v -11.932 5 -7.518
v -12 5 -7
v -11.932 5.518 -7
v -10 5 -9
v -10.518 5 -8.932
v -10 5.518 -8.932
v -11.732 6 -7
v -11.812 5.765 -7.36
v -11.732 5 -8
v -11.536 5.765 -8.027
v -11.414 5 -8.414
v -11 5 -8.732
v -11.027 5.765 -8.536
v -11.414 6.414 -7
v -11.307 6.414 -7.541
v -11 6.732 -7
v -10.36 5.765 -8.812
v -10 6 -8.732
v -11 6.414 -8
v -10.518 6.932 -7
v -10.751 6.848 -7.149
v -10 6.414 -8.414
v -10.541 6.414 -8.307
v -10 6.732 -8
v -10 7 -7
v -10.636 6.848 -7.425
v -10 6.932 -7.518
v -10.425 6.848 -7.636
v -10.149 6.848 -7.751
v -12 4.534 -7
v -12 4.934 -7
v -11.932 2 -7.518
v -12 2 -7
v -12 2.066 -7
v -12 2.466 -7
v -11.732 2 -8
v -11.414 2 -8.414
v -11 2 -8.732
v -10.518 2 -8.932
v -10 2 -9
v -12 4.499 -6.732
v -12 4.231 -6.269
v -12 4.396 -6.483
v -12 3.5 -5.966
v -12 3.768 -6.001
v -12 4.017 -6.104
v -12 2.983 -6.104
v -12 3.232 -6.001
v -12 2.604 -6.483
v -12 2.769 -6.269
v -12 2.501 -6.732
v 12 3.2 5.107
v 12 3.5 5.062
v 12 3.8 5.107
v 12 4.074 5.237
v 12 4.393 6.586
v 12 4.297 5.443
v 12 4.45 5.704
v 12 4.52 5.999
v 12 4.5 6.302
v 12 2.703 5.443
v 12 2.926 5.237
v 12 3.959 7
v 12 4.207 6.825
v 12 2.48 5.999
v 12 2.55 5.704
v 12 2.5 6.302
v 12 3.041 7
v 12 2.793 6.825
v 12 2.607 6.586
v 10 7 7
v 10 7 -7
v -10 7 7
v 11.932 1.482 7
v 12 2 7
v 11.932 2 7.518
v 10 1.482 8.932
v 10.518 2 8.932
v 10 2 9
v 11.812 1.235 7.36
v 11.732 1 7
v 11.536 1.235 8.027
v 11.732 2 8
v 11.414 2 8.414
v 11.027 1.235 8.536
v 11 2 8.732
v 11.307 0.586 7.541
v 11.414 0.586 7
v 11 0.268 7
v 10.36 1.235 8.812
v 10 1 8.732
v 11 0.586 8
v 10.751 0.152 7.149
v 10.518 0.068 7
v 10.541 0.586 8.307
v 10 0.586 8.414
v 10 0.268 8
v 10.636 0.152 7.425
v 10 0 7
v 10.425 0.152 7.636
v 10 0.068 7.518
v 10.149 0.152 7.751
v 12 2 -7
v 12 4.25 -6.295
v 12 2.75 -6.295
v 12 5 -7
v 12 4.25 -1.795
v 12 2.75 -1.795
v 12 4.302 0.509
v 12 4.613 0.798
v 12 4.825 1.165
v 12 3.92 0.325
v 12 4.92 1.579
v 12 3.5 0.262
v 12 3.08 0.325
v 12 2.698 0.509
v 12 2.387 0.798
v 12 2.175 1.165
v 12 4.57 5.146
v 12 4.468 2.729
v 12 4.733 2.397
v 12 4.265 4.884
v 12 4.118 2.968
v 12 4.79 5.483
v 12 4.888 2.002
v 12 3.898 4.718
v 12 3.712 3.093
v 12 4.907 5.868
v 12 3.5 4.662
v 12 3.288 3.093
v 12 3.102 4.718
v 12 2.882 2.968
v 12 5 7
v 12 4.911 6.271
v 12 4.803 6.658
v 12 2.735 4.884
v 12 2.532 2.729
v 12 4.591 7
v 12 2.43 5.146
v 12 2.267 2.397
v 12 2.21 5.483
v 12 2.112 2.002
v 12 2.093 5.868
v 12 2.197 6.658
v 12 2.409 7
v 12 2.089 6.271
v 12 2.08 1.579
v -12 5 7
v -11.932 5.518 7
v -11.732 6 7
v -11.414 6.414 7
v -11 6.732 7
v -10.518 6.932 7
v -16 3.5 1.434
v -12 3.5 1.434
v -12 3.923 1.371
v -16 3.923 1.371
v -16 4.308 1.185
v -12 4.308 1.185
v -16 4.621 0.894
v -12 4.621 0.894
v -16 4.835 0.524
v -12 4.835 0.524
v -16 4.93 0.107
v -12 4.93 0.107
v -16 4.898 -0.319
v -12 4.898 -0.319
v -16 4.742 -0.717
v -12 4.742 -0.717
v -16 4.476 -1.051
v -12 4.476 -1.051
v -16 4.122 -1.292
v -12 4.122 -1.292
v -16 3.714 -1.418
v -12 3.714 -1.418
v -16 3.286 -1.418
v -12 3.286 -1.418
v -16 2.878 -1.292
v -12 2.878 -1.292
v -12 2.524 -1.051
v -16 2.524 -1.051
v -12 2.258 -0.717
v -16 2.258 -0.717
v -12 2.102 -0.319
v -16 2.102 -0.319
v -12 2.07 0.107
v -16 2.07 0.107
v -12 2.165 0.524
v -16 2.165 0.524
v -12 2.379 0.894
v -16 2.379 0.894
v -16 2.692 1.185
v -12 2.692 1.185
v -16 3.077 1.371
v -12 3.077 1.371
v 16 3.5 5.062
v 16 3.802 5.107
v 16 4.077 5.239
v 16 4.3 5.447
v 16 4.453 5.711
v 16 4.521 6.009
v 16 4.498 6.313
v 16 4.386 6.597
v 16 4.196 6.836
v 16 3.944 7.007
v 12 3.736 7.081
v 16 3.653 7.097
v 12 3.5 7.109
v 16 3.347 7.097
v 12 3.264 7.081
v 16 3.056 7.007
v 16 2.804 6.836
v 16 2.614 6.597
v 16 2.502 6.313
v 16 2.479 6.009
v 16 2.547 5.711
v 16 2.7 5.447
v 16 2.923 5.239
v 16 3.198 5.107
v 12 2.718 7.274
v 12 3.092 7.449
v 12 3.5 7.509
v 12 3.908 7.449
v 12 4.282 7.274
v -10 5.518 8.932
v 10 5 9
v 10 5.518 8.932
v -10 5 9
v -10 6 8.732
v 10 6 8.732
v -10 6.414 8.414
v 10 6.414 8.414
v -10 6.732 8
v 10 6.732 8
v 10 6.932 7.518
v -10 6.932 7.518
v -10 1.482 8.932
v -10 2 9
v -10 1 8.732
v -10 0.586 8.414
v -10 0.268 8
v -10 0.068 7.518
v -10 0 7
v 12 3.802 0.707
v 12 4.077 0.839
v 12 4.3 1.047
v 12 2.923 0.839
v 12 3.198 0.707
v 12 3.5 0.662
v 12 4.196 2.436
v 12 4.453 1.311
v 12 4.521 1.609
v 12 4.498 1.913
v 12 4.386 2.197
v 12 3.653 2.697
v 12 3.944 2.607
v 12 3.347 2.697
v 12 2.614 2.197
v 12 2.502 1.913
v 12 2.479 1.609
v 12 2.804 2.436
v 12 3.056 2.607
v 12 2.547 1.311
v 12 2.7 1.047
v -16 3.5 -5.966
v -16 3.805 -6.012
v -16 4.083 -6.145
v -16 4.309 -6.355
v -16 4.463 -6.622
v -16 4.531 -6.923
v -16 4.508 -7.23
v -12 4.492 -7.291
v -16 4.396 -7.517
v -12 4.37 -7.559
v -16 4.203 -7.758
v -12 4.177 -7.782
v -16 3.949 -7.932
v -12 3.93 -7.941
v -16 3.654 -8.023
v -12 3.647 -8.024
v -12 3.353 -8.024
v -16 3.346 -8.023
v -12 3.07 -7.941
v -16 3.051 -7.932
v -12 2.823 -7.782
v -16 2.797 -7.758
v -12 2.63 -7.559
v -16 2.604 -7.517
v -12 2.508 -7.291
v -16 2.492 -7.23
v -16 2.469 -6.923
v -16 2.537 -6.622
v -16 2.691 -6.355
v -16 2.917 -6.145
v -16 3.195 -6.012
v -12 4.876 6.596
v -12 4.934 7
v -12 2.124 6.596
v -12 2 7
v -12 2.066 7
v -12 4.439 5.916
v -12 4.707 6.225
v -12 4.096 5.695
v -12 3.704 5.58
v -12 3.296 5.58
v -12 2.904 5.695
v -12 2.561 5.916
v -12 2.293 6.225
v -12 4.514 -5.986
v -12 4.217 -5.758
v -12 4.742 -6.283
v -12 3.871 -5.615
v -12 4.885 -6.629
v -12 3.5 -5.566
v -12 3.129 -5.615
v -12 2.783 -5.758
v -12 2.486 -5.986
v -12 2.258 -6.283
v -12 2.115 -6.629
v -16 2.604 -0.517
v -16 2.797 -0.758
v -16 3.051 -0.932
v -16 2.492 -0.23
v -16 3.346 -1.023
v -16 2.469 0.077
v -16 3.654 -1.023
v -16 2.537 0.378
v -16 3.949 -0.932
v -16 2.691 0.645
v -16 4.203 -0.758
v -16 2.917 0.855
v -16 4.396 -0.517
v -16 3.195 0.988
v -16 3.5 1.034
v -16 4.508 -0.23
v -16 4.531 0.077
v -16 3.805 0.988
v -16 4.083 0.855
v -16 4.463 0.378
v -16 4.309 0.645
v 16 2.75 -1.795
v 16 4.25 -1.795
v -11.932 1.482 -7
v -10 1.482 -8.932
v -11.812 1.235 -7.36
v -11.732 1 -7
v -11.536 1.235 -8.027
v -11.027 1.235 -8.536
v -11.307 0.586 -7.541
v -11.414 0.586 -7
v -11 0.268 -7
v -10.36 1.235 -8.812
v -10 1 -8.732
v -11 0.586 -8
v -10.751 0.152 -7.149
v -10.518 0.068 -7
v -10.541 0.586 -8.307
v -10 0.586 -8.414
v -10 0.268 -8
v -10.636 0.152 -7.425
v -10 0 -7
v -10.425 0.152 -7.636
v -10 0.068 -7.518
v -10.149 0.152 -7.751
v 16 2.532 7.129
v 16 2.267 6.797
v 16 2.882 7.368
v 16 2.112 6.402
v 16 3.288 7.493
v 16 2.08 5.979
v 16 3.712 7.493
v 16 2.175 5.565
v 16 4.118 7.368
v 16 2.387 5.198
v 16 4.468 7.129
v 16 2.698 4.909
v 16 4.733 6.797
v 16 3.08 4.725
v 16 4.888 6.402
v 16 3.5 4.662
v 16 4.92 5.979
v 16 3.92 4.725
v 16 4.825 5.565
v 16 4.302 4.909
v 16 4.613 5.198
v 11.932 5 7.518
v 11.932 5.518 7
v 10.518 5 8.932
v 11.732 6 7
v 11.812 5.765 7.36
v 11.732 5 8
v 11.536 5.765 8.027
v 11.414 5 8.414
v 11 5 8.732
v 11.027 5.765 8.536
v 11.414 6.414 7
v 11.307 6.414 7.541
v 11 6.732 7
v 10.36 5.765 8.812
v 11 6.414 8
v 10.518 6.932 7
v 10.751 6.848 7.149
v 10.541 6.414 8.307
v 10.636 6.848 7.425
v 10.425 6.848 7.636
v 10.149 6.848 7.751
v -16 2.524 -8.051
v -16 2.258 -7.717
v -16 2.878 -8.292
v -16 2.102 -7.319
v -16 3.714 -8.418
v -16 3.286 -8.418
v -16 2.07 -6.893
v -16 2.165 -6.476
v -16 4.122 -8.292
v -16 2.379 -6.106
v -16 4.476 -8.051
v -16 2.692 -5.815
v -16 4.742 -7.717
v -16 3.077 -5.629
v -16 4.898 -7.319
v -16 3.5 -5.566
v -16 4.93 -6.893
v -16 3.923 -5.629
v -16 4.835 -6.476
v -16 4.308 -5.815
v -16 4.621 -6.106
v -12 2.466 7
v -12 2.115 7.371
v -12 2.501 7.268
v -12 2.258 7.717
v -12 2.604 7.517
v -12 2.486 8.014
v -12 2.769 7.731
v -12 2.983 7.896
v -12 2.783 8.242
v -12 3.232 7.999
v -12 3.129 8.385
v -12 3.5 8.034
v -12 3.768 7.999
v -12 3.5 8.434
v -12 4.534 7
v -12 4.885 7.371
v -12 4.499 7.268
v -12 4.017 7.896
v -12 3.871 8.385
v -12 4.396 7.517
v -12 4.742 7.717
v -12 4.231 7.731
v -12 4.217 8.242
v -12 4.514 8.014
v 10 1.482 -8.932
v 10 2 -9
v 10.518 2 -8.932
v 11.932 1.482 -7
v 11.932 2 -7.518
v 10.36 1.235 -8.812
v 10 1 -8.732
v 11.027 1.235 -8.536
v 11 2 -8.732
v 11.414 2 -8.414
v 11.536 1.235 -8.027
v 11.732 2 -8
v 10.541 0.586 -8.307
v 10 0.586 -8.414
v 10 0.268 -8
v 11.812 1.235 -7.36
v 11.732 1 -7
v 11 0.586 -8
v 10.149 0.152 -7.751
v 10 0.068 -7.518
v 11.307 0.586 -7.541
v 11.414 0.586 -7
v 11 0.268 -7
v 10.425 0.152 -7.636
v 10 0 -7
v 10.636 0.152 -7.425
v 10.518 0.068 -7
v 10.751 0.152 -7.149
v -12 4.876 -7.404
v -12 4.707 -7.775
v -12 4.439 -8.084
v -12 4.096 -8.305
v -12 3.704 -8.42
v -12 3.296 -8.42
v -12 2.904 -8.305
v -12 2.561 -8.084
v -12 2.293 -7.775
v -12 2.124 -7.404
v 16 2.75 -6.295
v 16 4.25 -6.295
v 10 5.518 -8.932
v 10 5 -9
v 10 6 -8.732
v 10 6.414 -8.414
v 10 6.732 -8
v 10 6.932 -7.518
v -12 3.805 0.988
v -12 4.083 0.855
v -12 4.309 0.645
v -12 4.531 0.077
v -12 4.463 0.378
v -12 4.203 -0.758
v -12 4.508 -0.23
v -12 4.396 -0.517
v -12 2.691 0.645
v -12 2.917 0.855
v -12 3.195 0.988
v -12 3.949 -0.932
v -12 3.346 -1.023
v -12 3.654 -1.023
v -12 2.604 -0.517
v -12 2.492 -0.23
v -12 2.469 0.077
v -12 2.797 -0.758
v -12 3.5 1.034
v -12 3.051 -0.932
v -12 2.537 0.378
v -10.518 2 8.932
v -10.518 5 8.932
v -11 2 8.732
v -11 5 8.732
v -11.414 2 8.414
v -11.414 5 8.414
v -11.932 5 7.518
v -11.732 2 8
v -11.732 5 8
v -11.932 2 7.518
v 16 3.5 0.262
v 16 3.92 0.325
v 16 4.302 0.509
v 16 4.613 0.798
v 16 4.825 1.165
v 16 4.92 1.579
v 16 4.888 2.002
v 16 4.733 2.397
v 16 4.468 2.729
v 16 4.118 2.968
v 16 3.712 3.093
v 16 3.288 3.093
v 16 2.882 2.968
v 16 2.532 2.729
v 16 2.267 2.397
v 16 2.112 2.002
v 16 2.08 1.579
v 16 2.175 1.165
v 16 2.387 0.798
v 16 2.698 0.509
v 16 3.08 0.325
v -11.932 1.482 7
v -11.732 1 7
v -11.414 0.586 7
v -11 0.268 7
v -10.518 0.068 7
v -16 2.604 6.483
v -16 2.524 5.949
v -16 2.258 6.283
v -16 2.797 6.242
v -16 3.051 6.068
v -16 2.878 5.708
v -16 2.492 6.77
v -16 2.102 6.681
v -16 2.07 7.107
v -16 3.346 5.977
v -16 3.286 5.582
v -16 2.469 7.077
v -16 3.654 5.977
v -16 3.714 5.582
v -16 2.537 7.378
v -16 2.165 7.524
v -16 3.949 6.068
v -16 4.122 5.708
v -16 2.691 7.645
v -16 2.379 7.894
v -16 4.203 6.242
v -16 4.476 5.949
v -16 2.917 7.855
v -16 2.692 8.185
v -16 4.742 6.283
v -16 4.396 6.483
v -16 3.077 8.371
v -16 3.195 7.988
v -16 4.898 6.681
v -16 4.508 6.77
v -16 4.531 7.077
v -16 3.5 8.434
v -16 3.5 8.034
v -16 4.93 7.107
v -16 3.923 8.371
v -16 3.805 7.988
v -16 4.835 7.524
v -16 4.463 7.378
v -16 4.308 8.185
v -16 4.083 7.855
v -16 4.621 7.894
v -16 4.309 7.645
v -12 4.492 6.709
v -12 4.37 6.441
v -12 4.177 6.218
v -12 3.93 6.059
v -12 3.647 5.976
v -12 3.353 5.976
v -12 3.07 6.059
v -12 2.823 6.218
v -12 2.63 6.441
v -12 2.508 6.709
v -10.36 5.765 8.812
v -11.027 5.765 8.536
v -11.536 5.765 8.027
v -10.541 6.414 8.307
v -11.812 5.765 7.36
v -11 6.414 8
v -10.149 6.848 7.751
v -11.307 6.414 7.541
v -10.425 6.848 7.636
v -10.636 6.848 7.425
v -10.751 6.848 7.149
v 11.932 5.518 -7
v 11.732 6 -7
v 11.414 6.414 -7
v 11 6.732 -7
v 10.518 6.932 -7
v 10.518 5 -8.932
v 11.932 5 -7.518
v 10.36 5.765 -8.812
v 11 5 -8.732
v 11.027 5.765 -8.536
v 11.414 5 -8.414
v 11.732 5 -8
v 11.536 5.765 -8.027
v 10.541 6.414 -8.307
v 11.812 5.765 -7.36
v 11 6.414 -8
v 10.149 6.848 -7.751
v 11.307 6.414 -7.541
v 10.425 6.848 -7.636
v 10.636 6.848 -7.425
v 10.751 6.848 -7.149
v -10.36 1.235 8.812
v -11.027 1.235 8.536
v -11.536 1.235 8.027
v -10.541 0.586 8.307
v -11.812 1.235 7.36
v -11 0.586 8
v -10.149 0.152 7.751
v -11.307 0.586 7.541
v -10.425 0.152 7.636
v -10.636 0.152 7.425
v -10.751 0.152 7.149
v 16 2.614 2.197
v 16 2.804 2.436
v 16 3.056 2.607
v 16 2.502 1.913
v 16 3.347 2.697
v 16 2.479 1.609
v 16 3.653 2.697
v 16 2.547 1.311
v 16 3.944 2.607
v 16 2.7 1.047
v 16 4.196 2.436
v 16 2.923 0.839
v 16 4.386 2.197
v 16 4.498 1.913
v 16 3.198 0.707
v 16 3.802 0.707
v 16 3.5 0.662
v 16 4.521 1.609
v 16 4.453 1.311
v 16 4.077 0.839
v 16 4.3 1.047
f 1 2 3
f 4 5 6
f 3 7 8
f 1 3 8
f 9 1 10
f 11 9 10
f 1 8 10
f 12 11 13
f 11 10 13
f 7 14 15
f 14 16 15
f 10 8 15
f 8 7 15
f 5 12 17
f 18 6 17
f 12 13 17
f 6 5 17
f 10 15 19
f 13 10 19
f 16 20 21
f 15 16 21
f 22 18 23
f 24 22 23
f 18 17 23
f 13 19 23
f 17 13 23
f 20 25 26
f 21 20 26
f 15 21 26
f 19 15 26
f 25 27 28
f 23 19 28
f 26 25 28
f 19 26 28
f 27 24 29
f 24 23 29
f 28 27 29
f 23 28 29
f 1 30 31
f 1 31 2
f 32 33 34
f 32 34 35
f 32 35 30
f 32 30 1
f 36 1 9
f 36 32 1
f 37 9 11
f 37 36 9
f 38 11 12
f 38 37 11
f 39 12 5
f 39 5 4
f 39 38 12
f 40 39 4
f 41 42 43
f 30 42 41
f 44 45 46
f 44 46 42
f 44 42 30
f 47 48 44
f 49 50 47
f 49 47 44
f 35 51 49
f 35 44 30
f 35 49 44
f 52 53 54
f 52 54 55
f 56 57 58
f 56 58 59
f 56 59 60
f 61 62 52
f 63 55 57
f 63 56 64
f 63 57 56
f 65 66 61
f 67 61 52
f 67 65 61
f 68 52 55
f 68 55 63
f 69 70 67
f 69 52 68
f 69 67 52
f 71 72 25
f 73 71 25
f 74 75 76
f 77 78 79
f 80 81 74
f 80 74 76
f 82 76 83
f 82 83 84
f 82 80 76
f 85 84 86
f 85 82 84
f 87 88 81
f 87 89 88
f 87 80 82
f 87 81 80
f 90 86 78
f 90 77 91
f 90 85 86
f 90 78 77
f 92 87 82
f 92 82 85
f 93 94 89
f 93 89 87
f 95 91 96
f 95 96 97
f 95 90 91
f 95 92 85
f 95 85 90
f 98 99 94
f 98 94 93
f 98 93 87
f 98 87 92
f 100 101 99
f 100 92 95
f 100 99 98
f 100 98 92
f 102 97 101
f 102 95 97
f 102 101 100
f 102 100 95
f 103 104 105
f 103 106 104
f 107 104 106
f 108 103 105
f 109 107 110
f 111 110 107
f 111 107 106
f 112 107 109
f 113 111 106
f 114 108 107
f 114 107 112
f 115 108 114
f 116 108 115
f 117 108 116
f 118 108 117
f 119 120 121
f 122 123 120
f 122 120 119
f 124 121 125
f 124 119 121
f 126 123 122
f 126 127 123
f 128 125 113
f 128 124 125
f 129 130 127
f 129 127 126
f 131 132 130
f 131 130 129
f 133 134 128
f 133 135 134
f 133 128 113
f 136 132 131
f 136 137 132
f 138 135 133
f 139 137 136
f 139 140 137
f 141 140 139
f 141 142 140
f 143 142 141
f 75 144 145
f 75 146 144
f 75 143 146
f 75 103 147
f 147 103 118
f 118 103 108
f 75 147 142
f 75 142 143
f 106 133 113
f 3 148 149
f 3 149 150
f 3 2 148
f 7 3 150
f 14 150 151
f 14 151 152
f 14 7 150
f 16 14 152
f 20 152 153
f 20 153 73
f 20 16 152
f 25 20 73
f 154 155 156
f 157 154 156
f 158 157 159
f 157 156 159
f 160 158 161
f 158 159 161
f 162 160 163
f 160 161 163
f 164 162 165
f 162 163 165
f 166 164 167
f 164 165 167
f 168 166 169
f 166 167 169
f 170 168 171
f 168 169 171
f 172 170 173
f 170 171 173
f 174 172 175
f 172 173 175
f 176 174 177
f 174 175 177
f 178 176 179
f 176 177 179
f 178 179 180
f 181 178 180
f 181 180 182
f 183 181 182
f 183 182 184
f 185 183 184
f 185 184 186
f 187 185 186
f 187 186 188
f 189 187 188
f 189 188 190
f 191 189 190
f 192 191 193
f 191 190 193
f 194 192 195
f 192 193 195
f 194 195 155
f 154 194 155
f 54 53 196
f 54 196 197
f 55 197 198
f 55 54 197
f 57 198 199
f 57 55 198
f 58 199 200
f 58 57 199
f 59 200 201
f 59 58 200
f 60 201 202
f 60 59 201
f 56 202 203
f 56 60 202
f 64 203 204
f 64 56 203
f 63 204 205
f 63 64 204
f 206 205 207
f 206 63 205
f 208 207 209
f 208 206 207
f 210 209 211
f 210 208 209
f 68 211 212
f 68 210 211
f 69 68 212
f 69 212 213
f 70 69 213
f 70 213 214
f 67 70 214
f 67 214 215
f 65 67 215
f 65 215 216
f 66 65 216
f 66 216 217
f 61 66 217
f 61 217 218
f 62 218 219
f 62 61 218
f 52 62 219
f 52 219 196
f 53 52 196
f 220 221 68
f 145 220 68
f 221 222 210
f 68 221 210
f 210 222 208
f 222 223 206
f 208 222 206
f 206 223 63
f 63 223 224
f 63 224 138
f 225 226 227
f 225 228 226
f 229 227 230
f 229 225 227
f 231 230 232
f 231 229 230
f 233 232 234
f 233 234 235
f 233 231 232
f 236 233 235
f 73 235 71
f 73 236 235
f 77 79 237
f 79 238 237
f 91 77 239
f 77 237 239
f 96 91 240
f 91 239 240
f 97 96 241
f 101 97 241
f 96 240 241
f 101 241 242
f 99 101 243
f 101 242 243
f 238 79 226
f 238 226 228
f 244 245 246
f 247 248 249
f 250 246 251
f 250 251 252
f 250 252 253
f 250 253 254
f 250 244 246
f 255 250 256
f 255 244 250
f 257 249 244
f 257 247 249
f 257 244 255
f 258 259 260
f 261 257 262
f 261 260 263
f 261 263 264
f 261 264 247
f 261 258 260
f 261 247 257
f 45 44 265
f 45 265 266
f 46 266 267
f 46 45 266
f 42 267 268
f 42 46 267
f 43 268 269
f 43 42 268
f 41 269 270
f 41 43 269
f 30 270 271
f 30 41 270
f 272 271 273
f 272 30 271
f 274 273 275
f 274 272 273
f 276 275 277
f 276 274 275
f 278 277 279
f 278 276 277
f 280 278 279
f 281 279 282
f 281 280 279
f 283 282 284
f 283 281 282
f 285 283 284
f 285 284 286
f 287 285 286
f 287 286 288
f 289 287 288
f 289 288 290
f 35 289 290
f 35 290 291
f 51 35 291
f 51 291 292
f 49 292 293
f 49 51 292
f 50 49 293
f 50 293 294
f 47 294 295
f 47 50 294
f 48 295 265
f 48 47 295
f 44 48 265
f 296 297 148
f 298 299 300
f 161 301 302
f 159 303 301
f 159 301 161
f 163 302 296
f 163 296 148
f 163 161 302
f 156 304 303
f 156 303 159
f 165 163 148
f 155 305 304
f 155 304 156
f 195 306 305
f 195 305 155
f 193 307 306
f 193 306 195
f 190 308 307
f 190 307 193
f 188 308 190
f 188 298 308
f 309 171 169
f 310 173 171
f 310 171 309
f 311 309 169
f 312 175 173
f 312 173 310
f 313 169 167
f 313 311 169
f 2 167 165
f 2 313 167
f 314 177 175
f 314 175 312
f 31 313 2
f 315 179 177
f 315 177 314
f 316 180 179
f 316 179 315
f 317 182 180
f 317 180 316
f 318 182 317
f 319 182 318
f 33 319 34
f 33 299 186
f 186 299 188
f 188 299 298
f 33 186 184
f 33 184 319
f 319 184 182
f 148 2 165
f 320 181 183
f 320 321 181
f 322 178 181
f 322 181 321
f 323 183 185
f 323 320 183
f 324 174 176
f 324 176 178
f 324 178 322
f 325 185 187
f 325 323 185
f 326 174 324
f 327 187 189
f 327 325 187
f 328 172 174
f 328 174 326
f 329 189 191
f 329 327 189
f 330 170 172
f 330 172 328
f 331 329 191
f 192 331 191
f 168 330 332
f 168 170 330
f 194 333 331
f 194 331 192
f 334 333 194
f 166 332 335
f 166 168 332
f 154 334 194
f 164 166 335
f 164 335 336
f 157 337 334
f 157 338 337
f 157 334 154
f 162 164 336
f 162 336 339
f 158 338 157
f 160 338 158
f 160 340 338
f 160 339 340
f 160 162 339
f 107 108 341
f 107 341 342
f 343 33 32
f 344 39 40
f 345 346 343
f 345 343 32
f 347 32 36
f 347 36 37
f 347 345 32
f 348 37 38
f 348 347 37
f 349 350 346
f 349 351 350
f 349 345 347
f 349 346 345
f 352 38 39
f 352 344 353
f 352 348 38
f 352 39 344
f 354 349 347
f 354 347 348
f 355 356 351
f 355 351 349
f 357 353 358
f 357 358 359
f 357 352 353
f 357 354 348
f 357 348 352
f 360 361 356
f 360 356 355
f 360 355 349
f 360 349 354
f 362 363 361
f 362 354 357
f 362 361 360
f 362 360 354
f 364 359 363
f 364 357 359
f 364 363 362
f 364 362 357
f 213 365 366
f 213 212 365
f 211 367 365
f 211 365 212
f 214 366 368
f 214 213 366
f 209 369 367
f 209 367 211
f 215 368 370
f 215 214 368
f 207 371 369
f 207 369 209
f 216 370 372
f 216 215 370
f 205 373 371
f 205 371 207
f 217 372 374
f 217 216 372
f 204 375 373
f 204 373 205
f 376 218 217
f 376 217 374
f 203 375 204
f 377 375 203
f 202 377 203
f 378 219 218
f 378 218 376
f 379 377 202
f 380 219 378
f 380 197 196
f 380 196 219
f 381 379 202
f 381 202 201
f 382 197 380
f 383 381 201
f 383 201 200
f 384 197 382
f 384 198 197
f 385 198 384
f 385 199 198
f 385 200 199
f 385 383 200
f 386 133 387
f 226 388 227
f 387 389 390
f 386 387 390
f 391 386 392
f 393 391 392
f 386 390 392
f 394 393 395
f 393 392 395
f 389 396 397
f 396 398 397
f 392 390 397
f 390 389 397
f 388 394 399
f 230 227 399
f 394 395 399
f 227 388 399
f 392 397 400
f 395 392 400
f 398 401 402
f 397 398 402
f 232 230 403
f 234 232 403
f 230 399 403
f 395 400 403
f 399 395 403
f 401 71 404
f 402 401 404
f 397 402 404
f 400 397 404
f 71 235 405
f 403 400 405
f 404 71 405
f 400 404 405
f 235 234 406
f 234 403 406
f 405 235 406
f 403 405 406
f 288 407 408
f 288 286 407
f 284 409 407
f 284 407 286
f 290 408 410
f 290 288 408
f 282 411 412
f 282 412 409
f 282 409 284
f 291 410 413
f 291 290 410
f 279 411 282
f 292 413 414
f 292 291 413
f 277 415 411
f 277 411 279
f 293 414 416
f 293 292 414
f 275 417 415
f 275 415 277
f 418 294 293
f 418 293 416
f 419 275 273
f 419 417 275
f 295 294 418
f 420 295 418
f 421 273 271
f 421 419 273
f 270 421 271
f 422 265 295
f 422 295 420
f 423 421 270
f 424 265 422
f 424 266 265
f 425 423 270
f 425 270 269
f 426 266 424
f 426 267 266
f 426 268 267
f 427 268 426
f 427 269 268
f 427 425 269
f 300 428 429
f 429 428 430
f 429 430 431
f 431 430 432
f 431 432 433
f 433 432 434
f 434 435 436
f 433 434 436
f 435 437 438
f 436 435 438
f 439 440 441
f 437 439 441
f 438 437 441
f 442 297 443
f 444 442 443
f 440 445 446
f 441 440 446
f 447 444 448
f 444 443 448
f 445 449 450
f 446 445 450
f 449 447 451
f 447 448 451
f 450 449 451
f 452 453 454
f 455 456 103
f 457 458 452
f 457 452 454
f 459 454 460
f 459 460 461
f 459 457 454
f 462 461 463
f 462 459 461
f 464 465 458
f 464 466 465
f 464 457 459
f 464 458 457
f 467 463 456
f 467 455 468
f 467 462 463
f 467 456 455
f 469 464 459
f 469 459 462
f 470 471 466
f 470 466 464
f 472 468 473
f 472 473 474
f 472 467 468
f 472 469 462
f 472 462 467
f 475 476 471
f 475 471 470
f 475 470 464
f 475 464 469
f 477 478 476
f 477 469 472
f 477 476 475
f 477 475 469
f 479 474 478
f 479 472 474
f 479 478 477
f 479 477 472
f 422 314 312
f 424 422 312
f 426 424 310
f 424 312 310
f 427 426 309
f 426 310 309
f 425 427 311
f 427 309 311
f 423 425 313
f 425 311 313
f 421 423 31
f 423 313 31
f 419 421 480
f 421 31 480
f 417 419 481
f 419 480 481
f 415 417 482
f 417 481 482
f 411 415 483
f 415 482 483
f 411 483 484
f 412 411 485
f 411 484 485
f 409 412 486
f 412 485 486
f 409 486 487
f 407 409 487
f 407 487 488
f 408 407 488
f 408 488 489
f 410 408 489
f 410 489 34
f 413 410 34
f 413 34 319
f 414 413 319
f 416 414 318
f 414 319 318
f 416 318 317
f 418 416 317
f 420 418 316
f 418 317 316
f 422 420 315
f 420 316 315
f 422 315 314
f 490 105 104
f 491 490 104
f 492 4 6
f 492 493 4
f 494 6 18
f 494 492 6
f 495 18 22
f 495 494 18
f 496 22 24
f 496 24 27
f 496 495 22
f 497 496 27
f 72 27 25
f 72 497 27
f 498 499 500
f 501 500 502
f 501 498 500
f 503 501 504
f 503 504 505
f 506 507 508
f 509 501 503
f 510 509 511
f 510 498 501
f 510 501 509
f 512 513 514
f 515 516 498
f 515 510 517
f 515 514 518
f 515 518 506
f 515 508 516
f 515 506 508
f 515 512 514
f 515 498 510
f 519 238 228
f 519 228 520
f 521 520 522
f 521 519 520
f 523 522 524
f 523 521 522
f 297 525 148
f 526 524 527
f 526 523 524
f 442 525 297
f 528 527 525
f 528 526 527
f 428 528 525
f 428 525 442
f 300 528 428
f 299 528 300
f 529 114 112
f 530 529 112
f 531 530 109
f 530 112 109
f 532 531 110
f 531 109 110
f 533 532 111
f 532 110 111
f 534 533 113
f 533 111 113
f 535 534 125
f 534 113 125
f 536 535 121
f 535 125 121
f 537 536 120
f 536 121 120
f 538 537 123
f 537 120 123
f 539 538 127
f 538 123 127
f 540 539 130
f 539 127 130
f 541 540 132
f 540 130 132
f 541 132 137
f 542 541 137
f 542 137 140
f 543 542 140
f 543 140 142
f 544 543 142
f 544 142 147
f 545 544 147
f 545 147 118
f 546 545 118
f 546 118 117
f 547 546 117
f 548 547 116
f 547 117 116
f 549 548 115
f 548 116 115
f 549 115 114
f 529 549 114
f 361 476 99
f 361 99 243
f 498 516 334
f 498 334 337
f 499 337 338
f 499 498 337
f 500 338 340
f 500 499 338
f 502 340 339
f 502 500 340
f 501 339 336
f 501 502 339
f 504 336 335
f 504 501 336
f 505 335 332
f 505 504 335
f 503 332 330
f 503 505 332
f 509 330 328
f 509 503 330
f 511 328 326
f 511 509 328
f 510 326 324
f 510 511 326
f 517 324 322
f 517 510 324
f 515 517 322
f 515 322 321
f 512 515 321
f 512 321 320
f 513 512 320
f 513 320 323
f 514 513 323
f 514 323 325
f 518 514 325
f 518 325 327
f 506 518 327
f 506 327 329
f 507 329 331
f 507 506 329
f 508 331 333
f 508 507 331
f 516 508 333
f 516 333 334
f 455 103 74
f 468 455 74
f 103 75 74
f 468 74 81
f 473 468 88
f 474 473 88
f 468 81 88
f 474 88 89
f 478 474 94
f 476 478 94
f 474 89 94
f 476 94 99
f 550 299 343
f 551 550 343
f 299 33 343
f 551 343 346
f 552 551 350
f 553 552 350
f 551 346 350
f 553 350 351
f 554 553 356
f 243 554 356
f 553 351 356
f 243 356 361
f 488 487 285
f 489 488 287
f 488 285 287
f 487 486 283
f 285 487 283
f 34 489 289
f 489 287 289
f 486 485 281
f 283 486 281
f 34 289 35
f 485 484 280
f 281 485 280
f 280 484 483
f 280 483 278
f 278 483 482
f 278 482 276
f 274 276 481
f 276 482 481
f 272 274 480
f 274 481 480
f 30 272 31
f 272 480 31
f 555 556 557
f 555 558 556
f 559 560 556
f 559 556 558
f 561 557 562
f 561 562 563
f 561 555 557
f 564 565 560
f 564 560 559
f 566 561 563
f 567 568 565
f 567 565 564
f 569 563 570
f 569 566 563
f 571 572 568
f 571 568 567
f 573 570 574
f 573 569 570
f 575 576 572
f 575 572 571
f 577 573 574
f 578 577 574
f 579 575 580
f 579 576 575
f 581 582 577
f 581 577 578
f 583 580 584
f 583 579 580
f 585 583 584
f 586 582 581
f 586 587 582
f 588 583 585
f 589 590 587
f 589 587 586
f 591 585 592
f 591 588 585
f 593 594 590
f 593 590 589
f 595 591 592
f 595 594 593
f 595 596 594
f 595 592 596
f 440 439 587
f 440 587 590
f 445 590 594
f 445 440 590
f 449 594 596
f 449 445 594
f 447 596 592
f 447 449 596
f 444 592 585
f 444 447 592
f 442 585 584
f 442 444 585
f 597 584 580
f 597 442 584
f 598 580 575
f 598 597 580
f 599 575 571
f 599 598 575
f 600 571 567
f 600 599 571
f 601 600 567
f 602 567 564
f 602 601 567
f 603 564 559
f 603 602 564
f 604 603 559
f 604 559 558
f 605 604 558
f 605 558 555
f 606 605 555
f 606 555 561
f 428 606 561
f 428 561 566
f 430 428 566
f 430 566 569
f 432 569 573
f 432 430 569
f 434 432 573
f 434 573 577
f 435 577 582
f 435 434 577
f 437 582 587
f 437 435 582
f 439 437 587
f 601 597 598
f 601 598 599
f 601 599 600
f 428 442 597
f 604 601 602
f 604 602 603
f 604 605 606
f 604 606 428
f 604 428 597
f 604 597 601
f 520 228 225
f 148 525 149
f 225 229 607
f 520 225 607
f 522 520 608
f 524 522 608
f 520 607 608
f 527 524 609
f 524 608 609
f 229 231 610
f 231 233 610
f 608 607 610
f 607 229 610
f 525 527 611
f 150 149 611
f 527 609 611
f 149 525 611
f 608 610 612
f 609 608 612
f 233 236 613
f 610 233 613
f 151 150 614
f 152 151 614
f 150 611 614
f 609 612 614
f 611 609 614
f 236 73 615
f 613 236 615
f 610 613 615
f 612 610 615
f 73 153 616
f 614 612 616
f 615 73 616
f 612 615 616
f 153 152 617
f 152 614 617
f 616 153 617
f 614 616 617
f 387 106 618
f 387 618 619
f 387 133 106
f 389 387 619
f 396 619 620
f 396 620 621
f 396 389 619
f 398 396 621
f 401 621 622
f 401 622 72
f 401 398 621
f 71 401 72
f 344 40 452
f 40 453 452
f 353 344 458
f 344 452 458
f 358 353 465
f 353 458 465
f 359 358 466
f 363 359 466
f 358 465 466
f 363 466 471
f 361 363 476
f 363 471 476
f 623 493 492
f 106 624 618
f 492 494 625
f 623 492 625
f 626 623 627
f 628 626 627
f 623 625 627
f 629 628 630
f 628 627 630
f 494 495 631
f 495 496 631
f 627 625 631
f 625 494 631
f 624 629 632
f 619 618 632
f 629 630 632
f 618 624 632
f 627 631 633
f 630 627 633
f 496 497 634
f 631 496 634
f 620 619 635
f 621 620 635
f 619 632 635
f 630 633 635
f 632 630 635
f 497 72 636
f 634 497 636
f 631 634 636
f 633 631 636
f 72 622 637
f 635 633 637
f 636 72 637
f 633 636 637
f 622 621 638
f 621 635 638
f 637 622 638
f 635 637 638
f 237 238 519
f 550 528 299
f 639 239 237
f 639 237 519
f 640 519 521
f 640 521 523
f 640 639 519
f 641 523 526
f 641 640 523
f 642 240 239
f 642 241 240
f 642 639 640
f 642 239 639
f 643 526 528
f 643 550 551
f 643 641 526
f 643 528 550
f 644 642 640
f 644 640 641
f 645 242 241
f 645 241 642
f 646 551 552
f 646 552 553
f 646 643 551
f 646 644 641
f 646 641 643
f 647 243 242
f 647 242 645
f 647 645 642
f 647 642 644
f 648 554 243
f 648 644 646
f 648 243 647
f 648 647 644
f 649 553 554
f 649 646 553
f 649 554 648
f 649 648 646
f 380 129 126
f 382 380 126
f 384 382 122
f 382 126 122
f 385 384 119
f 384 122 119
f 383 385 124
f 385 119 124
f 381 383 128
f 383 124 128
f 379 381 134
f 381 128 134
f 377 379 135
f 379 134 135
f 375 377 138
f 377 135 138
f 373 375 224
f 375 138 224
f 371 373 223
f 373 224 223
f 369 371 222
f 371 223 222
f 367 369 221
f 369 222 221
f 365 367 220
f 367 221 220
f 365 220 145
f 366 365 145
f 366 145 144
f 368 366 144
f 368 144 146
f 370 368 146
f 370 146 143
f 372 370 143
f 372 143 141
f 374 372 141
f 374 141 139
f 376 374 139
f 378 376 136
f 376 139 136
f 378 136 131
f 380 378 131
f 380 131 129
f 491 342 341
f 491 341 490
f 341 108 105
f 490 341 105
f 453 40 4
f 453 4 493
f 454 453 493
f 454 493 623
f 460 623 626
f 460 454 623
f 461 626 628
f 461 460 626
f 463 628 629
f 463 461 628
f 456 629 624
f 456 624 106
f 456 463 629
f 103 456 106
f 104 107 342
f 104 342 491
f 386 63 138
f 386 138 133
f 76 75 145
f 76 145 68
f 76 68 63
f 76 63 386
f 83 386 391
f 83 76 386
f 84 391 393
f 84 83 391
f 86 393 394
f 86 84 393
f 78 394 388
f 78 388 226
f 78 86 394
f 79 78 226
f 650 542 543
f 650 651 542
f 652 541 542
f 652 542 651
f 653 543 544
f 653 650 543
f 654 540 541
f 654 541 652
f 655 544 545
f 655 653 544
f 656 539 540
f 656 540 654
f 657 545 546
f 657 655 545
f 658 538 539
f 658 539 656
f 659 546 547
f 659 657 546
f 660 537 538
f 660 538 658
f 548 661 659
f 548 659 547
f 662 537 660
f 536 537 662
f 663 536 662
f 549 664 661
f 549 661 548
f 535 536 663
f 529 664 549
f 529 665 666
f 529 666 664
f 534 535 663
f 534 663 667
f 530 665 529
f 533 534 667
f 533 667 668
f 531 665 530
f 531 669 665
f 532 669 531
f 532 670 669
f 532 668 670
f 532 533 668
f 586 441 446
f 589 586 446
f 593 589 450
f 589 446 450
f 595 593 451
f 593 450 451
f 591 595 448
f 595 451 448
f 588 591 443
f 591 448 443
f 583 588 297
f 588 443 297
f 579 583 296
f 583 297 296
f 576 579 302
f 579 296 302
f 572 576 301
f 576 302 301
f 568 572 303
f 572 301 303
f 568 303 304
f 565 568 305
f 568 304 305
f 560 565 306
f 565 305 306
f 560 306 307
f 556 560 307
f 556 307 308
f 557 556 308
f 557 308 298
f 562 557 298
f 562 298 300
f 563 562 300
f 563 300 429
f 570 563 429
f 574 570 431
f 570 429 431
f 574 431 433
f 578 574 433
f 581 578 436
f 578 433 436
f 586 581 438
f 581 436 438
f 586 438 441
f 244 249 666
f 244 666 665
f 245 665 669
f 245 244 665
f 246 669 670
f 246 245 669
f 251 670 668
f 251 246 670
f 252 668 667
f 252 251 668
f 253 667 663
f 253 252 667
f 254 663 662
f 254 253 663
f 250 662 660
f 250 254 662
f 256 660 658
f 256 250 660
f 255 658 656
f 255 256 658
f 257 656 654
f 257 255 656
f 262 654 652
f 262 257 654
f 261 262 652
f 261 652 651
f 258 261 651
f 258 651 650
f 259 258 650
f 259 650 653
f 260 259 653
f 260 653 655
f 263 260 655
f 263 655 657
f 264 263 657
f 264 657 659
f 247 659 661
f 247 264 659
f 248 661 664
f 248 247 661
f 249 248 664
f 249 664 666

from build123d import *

# Parameters (mm, degrees)
BOSS_EXTRUDE1_DEPTH = 7
FILLET1_R           = 2
SKETCH2_R           = 1.434229719
SKETCH2_R_2         = 1.034229719
BOSS_EXTRUDE2_DEPTH = 4
SKETCH3_R           = 1.423607329
SKETCH3_R_2         = 1.023607329
SKETCH3_W           = 4.5
SKETCH3_H           = 1.5
BOSS_EXTRUDE3_DEPTH = 4


with BuildPart() as part:
    # Sketch1 → Boss-Extrude1 (new body)
    with BuildSketch(Plane(origin=(0, 0, 0), x_dir=(1, 0, 0), z_dir=(0, 1, 0))):
        with BuildLine():
            Line((-10, 9), (10, 9))
            ThreePointArc((10, 9), (11.414213562, 8.414213562), (12, 7))
            Line((12, 7), (12, -7))
            ThreePointArc((12, -7), (11.414213562, -8.414213562), (10, -9))
            Line((10, -9), (-10, -9))
            ThreePointArc((-10, -9), (-11.414213562, -8.414213562), (-12, -7))
            Line((-12, -7), (-12, 7))
            ThreePointArc((-12, 7), (-11.414213562, 8.414213562), (-10, 9))
        make_face()
    extrude(amount=BOSS_EXTRUDE1_DEPTH)

    # Fillet1
    fillet1_edges = [part.edges().sort_by_distance(p)[0] for p in [
        (0, 0, -9),
        (11.414213562, 0, -8.414213562),
        (12, 0, 0),
        (11.414213562, 0, 8.414213562),
        (11.414213562, 7, -8.414213562),
        (0, 7, -9),
        (-11.414213562, 7, -8.414213562),
        (-12, 7, 0),
        (-11.414213562, 7, 8.414213562),
        (0, 7, 9),
        (11.414213562, 7, 8.414213562),
        (0, 0, 9),
        (12, 7, 0),
        (-11.414213562, 0, 8.414213562),
        (-12, 0, 0),
        (-11.414213562, 0, -8.414213562),
    ]]
    fillet(fillet1_edges, radius=FILLET1_R)

    # Sketch2 → Boss-Extrude2 (add)
    with BuildSketch(Plane.ZY.offset(12)):
        with Locations((-7, 3.5)):
            Circle(SKETCH2_R)
        with Locations((-7, 3.5)):
            Circle(SKETCH2_R_2, mode=Mode.SUBTRACT)
        with Locations((0, 3.5)):
            Circle(SKETCH2_R)
        with Locations((0, 3.5)):
            Circle(SKETCH2_R_2, mode=Mode.SUBTRACT)
        with Locations((7, 3.5)):
            Circle(SKETCH2_R)
        with Locations((7, 3.5)):
            Circle(SKETCH2_R_2, mode=Mode.SUBTRACT)
    extrude(amount=BOSS_EXTRUDE2_DEPTH)

    # Sketch3 → Boss-Extrude3 (add)
    with BuildSketch(Plane(origin=(12, 0, 0), x_dir=(0, 0, -1), z_dir=(1, 0, 0))):
        with Locations((-6.085184826, 3.5)):
            Circle(SKETCH3_R)
        with Locations((-6.085184826, 3.5)):
            Circle(SKETCH3_R_2, mode=Mode.SUBTRACT)
        with Locations((-1.685184826, 3.5)):
            Circle(SKETCH3_R)
        with Locations((-1.685184826, 3.5)):
            Circle(SKETCH3_R_2, mode=Mode.SUBTRACT)
        with Locations((4.044962508, 3.5)):
            Rectangle(SKETCH3_W, SKETCH3_H)
    extrude(amount=BOSS_EXTRUDE3_DEPTH)


solid = part.part
